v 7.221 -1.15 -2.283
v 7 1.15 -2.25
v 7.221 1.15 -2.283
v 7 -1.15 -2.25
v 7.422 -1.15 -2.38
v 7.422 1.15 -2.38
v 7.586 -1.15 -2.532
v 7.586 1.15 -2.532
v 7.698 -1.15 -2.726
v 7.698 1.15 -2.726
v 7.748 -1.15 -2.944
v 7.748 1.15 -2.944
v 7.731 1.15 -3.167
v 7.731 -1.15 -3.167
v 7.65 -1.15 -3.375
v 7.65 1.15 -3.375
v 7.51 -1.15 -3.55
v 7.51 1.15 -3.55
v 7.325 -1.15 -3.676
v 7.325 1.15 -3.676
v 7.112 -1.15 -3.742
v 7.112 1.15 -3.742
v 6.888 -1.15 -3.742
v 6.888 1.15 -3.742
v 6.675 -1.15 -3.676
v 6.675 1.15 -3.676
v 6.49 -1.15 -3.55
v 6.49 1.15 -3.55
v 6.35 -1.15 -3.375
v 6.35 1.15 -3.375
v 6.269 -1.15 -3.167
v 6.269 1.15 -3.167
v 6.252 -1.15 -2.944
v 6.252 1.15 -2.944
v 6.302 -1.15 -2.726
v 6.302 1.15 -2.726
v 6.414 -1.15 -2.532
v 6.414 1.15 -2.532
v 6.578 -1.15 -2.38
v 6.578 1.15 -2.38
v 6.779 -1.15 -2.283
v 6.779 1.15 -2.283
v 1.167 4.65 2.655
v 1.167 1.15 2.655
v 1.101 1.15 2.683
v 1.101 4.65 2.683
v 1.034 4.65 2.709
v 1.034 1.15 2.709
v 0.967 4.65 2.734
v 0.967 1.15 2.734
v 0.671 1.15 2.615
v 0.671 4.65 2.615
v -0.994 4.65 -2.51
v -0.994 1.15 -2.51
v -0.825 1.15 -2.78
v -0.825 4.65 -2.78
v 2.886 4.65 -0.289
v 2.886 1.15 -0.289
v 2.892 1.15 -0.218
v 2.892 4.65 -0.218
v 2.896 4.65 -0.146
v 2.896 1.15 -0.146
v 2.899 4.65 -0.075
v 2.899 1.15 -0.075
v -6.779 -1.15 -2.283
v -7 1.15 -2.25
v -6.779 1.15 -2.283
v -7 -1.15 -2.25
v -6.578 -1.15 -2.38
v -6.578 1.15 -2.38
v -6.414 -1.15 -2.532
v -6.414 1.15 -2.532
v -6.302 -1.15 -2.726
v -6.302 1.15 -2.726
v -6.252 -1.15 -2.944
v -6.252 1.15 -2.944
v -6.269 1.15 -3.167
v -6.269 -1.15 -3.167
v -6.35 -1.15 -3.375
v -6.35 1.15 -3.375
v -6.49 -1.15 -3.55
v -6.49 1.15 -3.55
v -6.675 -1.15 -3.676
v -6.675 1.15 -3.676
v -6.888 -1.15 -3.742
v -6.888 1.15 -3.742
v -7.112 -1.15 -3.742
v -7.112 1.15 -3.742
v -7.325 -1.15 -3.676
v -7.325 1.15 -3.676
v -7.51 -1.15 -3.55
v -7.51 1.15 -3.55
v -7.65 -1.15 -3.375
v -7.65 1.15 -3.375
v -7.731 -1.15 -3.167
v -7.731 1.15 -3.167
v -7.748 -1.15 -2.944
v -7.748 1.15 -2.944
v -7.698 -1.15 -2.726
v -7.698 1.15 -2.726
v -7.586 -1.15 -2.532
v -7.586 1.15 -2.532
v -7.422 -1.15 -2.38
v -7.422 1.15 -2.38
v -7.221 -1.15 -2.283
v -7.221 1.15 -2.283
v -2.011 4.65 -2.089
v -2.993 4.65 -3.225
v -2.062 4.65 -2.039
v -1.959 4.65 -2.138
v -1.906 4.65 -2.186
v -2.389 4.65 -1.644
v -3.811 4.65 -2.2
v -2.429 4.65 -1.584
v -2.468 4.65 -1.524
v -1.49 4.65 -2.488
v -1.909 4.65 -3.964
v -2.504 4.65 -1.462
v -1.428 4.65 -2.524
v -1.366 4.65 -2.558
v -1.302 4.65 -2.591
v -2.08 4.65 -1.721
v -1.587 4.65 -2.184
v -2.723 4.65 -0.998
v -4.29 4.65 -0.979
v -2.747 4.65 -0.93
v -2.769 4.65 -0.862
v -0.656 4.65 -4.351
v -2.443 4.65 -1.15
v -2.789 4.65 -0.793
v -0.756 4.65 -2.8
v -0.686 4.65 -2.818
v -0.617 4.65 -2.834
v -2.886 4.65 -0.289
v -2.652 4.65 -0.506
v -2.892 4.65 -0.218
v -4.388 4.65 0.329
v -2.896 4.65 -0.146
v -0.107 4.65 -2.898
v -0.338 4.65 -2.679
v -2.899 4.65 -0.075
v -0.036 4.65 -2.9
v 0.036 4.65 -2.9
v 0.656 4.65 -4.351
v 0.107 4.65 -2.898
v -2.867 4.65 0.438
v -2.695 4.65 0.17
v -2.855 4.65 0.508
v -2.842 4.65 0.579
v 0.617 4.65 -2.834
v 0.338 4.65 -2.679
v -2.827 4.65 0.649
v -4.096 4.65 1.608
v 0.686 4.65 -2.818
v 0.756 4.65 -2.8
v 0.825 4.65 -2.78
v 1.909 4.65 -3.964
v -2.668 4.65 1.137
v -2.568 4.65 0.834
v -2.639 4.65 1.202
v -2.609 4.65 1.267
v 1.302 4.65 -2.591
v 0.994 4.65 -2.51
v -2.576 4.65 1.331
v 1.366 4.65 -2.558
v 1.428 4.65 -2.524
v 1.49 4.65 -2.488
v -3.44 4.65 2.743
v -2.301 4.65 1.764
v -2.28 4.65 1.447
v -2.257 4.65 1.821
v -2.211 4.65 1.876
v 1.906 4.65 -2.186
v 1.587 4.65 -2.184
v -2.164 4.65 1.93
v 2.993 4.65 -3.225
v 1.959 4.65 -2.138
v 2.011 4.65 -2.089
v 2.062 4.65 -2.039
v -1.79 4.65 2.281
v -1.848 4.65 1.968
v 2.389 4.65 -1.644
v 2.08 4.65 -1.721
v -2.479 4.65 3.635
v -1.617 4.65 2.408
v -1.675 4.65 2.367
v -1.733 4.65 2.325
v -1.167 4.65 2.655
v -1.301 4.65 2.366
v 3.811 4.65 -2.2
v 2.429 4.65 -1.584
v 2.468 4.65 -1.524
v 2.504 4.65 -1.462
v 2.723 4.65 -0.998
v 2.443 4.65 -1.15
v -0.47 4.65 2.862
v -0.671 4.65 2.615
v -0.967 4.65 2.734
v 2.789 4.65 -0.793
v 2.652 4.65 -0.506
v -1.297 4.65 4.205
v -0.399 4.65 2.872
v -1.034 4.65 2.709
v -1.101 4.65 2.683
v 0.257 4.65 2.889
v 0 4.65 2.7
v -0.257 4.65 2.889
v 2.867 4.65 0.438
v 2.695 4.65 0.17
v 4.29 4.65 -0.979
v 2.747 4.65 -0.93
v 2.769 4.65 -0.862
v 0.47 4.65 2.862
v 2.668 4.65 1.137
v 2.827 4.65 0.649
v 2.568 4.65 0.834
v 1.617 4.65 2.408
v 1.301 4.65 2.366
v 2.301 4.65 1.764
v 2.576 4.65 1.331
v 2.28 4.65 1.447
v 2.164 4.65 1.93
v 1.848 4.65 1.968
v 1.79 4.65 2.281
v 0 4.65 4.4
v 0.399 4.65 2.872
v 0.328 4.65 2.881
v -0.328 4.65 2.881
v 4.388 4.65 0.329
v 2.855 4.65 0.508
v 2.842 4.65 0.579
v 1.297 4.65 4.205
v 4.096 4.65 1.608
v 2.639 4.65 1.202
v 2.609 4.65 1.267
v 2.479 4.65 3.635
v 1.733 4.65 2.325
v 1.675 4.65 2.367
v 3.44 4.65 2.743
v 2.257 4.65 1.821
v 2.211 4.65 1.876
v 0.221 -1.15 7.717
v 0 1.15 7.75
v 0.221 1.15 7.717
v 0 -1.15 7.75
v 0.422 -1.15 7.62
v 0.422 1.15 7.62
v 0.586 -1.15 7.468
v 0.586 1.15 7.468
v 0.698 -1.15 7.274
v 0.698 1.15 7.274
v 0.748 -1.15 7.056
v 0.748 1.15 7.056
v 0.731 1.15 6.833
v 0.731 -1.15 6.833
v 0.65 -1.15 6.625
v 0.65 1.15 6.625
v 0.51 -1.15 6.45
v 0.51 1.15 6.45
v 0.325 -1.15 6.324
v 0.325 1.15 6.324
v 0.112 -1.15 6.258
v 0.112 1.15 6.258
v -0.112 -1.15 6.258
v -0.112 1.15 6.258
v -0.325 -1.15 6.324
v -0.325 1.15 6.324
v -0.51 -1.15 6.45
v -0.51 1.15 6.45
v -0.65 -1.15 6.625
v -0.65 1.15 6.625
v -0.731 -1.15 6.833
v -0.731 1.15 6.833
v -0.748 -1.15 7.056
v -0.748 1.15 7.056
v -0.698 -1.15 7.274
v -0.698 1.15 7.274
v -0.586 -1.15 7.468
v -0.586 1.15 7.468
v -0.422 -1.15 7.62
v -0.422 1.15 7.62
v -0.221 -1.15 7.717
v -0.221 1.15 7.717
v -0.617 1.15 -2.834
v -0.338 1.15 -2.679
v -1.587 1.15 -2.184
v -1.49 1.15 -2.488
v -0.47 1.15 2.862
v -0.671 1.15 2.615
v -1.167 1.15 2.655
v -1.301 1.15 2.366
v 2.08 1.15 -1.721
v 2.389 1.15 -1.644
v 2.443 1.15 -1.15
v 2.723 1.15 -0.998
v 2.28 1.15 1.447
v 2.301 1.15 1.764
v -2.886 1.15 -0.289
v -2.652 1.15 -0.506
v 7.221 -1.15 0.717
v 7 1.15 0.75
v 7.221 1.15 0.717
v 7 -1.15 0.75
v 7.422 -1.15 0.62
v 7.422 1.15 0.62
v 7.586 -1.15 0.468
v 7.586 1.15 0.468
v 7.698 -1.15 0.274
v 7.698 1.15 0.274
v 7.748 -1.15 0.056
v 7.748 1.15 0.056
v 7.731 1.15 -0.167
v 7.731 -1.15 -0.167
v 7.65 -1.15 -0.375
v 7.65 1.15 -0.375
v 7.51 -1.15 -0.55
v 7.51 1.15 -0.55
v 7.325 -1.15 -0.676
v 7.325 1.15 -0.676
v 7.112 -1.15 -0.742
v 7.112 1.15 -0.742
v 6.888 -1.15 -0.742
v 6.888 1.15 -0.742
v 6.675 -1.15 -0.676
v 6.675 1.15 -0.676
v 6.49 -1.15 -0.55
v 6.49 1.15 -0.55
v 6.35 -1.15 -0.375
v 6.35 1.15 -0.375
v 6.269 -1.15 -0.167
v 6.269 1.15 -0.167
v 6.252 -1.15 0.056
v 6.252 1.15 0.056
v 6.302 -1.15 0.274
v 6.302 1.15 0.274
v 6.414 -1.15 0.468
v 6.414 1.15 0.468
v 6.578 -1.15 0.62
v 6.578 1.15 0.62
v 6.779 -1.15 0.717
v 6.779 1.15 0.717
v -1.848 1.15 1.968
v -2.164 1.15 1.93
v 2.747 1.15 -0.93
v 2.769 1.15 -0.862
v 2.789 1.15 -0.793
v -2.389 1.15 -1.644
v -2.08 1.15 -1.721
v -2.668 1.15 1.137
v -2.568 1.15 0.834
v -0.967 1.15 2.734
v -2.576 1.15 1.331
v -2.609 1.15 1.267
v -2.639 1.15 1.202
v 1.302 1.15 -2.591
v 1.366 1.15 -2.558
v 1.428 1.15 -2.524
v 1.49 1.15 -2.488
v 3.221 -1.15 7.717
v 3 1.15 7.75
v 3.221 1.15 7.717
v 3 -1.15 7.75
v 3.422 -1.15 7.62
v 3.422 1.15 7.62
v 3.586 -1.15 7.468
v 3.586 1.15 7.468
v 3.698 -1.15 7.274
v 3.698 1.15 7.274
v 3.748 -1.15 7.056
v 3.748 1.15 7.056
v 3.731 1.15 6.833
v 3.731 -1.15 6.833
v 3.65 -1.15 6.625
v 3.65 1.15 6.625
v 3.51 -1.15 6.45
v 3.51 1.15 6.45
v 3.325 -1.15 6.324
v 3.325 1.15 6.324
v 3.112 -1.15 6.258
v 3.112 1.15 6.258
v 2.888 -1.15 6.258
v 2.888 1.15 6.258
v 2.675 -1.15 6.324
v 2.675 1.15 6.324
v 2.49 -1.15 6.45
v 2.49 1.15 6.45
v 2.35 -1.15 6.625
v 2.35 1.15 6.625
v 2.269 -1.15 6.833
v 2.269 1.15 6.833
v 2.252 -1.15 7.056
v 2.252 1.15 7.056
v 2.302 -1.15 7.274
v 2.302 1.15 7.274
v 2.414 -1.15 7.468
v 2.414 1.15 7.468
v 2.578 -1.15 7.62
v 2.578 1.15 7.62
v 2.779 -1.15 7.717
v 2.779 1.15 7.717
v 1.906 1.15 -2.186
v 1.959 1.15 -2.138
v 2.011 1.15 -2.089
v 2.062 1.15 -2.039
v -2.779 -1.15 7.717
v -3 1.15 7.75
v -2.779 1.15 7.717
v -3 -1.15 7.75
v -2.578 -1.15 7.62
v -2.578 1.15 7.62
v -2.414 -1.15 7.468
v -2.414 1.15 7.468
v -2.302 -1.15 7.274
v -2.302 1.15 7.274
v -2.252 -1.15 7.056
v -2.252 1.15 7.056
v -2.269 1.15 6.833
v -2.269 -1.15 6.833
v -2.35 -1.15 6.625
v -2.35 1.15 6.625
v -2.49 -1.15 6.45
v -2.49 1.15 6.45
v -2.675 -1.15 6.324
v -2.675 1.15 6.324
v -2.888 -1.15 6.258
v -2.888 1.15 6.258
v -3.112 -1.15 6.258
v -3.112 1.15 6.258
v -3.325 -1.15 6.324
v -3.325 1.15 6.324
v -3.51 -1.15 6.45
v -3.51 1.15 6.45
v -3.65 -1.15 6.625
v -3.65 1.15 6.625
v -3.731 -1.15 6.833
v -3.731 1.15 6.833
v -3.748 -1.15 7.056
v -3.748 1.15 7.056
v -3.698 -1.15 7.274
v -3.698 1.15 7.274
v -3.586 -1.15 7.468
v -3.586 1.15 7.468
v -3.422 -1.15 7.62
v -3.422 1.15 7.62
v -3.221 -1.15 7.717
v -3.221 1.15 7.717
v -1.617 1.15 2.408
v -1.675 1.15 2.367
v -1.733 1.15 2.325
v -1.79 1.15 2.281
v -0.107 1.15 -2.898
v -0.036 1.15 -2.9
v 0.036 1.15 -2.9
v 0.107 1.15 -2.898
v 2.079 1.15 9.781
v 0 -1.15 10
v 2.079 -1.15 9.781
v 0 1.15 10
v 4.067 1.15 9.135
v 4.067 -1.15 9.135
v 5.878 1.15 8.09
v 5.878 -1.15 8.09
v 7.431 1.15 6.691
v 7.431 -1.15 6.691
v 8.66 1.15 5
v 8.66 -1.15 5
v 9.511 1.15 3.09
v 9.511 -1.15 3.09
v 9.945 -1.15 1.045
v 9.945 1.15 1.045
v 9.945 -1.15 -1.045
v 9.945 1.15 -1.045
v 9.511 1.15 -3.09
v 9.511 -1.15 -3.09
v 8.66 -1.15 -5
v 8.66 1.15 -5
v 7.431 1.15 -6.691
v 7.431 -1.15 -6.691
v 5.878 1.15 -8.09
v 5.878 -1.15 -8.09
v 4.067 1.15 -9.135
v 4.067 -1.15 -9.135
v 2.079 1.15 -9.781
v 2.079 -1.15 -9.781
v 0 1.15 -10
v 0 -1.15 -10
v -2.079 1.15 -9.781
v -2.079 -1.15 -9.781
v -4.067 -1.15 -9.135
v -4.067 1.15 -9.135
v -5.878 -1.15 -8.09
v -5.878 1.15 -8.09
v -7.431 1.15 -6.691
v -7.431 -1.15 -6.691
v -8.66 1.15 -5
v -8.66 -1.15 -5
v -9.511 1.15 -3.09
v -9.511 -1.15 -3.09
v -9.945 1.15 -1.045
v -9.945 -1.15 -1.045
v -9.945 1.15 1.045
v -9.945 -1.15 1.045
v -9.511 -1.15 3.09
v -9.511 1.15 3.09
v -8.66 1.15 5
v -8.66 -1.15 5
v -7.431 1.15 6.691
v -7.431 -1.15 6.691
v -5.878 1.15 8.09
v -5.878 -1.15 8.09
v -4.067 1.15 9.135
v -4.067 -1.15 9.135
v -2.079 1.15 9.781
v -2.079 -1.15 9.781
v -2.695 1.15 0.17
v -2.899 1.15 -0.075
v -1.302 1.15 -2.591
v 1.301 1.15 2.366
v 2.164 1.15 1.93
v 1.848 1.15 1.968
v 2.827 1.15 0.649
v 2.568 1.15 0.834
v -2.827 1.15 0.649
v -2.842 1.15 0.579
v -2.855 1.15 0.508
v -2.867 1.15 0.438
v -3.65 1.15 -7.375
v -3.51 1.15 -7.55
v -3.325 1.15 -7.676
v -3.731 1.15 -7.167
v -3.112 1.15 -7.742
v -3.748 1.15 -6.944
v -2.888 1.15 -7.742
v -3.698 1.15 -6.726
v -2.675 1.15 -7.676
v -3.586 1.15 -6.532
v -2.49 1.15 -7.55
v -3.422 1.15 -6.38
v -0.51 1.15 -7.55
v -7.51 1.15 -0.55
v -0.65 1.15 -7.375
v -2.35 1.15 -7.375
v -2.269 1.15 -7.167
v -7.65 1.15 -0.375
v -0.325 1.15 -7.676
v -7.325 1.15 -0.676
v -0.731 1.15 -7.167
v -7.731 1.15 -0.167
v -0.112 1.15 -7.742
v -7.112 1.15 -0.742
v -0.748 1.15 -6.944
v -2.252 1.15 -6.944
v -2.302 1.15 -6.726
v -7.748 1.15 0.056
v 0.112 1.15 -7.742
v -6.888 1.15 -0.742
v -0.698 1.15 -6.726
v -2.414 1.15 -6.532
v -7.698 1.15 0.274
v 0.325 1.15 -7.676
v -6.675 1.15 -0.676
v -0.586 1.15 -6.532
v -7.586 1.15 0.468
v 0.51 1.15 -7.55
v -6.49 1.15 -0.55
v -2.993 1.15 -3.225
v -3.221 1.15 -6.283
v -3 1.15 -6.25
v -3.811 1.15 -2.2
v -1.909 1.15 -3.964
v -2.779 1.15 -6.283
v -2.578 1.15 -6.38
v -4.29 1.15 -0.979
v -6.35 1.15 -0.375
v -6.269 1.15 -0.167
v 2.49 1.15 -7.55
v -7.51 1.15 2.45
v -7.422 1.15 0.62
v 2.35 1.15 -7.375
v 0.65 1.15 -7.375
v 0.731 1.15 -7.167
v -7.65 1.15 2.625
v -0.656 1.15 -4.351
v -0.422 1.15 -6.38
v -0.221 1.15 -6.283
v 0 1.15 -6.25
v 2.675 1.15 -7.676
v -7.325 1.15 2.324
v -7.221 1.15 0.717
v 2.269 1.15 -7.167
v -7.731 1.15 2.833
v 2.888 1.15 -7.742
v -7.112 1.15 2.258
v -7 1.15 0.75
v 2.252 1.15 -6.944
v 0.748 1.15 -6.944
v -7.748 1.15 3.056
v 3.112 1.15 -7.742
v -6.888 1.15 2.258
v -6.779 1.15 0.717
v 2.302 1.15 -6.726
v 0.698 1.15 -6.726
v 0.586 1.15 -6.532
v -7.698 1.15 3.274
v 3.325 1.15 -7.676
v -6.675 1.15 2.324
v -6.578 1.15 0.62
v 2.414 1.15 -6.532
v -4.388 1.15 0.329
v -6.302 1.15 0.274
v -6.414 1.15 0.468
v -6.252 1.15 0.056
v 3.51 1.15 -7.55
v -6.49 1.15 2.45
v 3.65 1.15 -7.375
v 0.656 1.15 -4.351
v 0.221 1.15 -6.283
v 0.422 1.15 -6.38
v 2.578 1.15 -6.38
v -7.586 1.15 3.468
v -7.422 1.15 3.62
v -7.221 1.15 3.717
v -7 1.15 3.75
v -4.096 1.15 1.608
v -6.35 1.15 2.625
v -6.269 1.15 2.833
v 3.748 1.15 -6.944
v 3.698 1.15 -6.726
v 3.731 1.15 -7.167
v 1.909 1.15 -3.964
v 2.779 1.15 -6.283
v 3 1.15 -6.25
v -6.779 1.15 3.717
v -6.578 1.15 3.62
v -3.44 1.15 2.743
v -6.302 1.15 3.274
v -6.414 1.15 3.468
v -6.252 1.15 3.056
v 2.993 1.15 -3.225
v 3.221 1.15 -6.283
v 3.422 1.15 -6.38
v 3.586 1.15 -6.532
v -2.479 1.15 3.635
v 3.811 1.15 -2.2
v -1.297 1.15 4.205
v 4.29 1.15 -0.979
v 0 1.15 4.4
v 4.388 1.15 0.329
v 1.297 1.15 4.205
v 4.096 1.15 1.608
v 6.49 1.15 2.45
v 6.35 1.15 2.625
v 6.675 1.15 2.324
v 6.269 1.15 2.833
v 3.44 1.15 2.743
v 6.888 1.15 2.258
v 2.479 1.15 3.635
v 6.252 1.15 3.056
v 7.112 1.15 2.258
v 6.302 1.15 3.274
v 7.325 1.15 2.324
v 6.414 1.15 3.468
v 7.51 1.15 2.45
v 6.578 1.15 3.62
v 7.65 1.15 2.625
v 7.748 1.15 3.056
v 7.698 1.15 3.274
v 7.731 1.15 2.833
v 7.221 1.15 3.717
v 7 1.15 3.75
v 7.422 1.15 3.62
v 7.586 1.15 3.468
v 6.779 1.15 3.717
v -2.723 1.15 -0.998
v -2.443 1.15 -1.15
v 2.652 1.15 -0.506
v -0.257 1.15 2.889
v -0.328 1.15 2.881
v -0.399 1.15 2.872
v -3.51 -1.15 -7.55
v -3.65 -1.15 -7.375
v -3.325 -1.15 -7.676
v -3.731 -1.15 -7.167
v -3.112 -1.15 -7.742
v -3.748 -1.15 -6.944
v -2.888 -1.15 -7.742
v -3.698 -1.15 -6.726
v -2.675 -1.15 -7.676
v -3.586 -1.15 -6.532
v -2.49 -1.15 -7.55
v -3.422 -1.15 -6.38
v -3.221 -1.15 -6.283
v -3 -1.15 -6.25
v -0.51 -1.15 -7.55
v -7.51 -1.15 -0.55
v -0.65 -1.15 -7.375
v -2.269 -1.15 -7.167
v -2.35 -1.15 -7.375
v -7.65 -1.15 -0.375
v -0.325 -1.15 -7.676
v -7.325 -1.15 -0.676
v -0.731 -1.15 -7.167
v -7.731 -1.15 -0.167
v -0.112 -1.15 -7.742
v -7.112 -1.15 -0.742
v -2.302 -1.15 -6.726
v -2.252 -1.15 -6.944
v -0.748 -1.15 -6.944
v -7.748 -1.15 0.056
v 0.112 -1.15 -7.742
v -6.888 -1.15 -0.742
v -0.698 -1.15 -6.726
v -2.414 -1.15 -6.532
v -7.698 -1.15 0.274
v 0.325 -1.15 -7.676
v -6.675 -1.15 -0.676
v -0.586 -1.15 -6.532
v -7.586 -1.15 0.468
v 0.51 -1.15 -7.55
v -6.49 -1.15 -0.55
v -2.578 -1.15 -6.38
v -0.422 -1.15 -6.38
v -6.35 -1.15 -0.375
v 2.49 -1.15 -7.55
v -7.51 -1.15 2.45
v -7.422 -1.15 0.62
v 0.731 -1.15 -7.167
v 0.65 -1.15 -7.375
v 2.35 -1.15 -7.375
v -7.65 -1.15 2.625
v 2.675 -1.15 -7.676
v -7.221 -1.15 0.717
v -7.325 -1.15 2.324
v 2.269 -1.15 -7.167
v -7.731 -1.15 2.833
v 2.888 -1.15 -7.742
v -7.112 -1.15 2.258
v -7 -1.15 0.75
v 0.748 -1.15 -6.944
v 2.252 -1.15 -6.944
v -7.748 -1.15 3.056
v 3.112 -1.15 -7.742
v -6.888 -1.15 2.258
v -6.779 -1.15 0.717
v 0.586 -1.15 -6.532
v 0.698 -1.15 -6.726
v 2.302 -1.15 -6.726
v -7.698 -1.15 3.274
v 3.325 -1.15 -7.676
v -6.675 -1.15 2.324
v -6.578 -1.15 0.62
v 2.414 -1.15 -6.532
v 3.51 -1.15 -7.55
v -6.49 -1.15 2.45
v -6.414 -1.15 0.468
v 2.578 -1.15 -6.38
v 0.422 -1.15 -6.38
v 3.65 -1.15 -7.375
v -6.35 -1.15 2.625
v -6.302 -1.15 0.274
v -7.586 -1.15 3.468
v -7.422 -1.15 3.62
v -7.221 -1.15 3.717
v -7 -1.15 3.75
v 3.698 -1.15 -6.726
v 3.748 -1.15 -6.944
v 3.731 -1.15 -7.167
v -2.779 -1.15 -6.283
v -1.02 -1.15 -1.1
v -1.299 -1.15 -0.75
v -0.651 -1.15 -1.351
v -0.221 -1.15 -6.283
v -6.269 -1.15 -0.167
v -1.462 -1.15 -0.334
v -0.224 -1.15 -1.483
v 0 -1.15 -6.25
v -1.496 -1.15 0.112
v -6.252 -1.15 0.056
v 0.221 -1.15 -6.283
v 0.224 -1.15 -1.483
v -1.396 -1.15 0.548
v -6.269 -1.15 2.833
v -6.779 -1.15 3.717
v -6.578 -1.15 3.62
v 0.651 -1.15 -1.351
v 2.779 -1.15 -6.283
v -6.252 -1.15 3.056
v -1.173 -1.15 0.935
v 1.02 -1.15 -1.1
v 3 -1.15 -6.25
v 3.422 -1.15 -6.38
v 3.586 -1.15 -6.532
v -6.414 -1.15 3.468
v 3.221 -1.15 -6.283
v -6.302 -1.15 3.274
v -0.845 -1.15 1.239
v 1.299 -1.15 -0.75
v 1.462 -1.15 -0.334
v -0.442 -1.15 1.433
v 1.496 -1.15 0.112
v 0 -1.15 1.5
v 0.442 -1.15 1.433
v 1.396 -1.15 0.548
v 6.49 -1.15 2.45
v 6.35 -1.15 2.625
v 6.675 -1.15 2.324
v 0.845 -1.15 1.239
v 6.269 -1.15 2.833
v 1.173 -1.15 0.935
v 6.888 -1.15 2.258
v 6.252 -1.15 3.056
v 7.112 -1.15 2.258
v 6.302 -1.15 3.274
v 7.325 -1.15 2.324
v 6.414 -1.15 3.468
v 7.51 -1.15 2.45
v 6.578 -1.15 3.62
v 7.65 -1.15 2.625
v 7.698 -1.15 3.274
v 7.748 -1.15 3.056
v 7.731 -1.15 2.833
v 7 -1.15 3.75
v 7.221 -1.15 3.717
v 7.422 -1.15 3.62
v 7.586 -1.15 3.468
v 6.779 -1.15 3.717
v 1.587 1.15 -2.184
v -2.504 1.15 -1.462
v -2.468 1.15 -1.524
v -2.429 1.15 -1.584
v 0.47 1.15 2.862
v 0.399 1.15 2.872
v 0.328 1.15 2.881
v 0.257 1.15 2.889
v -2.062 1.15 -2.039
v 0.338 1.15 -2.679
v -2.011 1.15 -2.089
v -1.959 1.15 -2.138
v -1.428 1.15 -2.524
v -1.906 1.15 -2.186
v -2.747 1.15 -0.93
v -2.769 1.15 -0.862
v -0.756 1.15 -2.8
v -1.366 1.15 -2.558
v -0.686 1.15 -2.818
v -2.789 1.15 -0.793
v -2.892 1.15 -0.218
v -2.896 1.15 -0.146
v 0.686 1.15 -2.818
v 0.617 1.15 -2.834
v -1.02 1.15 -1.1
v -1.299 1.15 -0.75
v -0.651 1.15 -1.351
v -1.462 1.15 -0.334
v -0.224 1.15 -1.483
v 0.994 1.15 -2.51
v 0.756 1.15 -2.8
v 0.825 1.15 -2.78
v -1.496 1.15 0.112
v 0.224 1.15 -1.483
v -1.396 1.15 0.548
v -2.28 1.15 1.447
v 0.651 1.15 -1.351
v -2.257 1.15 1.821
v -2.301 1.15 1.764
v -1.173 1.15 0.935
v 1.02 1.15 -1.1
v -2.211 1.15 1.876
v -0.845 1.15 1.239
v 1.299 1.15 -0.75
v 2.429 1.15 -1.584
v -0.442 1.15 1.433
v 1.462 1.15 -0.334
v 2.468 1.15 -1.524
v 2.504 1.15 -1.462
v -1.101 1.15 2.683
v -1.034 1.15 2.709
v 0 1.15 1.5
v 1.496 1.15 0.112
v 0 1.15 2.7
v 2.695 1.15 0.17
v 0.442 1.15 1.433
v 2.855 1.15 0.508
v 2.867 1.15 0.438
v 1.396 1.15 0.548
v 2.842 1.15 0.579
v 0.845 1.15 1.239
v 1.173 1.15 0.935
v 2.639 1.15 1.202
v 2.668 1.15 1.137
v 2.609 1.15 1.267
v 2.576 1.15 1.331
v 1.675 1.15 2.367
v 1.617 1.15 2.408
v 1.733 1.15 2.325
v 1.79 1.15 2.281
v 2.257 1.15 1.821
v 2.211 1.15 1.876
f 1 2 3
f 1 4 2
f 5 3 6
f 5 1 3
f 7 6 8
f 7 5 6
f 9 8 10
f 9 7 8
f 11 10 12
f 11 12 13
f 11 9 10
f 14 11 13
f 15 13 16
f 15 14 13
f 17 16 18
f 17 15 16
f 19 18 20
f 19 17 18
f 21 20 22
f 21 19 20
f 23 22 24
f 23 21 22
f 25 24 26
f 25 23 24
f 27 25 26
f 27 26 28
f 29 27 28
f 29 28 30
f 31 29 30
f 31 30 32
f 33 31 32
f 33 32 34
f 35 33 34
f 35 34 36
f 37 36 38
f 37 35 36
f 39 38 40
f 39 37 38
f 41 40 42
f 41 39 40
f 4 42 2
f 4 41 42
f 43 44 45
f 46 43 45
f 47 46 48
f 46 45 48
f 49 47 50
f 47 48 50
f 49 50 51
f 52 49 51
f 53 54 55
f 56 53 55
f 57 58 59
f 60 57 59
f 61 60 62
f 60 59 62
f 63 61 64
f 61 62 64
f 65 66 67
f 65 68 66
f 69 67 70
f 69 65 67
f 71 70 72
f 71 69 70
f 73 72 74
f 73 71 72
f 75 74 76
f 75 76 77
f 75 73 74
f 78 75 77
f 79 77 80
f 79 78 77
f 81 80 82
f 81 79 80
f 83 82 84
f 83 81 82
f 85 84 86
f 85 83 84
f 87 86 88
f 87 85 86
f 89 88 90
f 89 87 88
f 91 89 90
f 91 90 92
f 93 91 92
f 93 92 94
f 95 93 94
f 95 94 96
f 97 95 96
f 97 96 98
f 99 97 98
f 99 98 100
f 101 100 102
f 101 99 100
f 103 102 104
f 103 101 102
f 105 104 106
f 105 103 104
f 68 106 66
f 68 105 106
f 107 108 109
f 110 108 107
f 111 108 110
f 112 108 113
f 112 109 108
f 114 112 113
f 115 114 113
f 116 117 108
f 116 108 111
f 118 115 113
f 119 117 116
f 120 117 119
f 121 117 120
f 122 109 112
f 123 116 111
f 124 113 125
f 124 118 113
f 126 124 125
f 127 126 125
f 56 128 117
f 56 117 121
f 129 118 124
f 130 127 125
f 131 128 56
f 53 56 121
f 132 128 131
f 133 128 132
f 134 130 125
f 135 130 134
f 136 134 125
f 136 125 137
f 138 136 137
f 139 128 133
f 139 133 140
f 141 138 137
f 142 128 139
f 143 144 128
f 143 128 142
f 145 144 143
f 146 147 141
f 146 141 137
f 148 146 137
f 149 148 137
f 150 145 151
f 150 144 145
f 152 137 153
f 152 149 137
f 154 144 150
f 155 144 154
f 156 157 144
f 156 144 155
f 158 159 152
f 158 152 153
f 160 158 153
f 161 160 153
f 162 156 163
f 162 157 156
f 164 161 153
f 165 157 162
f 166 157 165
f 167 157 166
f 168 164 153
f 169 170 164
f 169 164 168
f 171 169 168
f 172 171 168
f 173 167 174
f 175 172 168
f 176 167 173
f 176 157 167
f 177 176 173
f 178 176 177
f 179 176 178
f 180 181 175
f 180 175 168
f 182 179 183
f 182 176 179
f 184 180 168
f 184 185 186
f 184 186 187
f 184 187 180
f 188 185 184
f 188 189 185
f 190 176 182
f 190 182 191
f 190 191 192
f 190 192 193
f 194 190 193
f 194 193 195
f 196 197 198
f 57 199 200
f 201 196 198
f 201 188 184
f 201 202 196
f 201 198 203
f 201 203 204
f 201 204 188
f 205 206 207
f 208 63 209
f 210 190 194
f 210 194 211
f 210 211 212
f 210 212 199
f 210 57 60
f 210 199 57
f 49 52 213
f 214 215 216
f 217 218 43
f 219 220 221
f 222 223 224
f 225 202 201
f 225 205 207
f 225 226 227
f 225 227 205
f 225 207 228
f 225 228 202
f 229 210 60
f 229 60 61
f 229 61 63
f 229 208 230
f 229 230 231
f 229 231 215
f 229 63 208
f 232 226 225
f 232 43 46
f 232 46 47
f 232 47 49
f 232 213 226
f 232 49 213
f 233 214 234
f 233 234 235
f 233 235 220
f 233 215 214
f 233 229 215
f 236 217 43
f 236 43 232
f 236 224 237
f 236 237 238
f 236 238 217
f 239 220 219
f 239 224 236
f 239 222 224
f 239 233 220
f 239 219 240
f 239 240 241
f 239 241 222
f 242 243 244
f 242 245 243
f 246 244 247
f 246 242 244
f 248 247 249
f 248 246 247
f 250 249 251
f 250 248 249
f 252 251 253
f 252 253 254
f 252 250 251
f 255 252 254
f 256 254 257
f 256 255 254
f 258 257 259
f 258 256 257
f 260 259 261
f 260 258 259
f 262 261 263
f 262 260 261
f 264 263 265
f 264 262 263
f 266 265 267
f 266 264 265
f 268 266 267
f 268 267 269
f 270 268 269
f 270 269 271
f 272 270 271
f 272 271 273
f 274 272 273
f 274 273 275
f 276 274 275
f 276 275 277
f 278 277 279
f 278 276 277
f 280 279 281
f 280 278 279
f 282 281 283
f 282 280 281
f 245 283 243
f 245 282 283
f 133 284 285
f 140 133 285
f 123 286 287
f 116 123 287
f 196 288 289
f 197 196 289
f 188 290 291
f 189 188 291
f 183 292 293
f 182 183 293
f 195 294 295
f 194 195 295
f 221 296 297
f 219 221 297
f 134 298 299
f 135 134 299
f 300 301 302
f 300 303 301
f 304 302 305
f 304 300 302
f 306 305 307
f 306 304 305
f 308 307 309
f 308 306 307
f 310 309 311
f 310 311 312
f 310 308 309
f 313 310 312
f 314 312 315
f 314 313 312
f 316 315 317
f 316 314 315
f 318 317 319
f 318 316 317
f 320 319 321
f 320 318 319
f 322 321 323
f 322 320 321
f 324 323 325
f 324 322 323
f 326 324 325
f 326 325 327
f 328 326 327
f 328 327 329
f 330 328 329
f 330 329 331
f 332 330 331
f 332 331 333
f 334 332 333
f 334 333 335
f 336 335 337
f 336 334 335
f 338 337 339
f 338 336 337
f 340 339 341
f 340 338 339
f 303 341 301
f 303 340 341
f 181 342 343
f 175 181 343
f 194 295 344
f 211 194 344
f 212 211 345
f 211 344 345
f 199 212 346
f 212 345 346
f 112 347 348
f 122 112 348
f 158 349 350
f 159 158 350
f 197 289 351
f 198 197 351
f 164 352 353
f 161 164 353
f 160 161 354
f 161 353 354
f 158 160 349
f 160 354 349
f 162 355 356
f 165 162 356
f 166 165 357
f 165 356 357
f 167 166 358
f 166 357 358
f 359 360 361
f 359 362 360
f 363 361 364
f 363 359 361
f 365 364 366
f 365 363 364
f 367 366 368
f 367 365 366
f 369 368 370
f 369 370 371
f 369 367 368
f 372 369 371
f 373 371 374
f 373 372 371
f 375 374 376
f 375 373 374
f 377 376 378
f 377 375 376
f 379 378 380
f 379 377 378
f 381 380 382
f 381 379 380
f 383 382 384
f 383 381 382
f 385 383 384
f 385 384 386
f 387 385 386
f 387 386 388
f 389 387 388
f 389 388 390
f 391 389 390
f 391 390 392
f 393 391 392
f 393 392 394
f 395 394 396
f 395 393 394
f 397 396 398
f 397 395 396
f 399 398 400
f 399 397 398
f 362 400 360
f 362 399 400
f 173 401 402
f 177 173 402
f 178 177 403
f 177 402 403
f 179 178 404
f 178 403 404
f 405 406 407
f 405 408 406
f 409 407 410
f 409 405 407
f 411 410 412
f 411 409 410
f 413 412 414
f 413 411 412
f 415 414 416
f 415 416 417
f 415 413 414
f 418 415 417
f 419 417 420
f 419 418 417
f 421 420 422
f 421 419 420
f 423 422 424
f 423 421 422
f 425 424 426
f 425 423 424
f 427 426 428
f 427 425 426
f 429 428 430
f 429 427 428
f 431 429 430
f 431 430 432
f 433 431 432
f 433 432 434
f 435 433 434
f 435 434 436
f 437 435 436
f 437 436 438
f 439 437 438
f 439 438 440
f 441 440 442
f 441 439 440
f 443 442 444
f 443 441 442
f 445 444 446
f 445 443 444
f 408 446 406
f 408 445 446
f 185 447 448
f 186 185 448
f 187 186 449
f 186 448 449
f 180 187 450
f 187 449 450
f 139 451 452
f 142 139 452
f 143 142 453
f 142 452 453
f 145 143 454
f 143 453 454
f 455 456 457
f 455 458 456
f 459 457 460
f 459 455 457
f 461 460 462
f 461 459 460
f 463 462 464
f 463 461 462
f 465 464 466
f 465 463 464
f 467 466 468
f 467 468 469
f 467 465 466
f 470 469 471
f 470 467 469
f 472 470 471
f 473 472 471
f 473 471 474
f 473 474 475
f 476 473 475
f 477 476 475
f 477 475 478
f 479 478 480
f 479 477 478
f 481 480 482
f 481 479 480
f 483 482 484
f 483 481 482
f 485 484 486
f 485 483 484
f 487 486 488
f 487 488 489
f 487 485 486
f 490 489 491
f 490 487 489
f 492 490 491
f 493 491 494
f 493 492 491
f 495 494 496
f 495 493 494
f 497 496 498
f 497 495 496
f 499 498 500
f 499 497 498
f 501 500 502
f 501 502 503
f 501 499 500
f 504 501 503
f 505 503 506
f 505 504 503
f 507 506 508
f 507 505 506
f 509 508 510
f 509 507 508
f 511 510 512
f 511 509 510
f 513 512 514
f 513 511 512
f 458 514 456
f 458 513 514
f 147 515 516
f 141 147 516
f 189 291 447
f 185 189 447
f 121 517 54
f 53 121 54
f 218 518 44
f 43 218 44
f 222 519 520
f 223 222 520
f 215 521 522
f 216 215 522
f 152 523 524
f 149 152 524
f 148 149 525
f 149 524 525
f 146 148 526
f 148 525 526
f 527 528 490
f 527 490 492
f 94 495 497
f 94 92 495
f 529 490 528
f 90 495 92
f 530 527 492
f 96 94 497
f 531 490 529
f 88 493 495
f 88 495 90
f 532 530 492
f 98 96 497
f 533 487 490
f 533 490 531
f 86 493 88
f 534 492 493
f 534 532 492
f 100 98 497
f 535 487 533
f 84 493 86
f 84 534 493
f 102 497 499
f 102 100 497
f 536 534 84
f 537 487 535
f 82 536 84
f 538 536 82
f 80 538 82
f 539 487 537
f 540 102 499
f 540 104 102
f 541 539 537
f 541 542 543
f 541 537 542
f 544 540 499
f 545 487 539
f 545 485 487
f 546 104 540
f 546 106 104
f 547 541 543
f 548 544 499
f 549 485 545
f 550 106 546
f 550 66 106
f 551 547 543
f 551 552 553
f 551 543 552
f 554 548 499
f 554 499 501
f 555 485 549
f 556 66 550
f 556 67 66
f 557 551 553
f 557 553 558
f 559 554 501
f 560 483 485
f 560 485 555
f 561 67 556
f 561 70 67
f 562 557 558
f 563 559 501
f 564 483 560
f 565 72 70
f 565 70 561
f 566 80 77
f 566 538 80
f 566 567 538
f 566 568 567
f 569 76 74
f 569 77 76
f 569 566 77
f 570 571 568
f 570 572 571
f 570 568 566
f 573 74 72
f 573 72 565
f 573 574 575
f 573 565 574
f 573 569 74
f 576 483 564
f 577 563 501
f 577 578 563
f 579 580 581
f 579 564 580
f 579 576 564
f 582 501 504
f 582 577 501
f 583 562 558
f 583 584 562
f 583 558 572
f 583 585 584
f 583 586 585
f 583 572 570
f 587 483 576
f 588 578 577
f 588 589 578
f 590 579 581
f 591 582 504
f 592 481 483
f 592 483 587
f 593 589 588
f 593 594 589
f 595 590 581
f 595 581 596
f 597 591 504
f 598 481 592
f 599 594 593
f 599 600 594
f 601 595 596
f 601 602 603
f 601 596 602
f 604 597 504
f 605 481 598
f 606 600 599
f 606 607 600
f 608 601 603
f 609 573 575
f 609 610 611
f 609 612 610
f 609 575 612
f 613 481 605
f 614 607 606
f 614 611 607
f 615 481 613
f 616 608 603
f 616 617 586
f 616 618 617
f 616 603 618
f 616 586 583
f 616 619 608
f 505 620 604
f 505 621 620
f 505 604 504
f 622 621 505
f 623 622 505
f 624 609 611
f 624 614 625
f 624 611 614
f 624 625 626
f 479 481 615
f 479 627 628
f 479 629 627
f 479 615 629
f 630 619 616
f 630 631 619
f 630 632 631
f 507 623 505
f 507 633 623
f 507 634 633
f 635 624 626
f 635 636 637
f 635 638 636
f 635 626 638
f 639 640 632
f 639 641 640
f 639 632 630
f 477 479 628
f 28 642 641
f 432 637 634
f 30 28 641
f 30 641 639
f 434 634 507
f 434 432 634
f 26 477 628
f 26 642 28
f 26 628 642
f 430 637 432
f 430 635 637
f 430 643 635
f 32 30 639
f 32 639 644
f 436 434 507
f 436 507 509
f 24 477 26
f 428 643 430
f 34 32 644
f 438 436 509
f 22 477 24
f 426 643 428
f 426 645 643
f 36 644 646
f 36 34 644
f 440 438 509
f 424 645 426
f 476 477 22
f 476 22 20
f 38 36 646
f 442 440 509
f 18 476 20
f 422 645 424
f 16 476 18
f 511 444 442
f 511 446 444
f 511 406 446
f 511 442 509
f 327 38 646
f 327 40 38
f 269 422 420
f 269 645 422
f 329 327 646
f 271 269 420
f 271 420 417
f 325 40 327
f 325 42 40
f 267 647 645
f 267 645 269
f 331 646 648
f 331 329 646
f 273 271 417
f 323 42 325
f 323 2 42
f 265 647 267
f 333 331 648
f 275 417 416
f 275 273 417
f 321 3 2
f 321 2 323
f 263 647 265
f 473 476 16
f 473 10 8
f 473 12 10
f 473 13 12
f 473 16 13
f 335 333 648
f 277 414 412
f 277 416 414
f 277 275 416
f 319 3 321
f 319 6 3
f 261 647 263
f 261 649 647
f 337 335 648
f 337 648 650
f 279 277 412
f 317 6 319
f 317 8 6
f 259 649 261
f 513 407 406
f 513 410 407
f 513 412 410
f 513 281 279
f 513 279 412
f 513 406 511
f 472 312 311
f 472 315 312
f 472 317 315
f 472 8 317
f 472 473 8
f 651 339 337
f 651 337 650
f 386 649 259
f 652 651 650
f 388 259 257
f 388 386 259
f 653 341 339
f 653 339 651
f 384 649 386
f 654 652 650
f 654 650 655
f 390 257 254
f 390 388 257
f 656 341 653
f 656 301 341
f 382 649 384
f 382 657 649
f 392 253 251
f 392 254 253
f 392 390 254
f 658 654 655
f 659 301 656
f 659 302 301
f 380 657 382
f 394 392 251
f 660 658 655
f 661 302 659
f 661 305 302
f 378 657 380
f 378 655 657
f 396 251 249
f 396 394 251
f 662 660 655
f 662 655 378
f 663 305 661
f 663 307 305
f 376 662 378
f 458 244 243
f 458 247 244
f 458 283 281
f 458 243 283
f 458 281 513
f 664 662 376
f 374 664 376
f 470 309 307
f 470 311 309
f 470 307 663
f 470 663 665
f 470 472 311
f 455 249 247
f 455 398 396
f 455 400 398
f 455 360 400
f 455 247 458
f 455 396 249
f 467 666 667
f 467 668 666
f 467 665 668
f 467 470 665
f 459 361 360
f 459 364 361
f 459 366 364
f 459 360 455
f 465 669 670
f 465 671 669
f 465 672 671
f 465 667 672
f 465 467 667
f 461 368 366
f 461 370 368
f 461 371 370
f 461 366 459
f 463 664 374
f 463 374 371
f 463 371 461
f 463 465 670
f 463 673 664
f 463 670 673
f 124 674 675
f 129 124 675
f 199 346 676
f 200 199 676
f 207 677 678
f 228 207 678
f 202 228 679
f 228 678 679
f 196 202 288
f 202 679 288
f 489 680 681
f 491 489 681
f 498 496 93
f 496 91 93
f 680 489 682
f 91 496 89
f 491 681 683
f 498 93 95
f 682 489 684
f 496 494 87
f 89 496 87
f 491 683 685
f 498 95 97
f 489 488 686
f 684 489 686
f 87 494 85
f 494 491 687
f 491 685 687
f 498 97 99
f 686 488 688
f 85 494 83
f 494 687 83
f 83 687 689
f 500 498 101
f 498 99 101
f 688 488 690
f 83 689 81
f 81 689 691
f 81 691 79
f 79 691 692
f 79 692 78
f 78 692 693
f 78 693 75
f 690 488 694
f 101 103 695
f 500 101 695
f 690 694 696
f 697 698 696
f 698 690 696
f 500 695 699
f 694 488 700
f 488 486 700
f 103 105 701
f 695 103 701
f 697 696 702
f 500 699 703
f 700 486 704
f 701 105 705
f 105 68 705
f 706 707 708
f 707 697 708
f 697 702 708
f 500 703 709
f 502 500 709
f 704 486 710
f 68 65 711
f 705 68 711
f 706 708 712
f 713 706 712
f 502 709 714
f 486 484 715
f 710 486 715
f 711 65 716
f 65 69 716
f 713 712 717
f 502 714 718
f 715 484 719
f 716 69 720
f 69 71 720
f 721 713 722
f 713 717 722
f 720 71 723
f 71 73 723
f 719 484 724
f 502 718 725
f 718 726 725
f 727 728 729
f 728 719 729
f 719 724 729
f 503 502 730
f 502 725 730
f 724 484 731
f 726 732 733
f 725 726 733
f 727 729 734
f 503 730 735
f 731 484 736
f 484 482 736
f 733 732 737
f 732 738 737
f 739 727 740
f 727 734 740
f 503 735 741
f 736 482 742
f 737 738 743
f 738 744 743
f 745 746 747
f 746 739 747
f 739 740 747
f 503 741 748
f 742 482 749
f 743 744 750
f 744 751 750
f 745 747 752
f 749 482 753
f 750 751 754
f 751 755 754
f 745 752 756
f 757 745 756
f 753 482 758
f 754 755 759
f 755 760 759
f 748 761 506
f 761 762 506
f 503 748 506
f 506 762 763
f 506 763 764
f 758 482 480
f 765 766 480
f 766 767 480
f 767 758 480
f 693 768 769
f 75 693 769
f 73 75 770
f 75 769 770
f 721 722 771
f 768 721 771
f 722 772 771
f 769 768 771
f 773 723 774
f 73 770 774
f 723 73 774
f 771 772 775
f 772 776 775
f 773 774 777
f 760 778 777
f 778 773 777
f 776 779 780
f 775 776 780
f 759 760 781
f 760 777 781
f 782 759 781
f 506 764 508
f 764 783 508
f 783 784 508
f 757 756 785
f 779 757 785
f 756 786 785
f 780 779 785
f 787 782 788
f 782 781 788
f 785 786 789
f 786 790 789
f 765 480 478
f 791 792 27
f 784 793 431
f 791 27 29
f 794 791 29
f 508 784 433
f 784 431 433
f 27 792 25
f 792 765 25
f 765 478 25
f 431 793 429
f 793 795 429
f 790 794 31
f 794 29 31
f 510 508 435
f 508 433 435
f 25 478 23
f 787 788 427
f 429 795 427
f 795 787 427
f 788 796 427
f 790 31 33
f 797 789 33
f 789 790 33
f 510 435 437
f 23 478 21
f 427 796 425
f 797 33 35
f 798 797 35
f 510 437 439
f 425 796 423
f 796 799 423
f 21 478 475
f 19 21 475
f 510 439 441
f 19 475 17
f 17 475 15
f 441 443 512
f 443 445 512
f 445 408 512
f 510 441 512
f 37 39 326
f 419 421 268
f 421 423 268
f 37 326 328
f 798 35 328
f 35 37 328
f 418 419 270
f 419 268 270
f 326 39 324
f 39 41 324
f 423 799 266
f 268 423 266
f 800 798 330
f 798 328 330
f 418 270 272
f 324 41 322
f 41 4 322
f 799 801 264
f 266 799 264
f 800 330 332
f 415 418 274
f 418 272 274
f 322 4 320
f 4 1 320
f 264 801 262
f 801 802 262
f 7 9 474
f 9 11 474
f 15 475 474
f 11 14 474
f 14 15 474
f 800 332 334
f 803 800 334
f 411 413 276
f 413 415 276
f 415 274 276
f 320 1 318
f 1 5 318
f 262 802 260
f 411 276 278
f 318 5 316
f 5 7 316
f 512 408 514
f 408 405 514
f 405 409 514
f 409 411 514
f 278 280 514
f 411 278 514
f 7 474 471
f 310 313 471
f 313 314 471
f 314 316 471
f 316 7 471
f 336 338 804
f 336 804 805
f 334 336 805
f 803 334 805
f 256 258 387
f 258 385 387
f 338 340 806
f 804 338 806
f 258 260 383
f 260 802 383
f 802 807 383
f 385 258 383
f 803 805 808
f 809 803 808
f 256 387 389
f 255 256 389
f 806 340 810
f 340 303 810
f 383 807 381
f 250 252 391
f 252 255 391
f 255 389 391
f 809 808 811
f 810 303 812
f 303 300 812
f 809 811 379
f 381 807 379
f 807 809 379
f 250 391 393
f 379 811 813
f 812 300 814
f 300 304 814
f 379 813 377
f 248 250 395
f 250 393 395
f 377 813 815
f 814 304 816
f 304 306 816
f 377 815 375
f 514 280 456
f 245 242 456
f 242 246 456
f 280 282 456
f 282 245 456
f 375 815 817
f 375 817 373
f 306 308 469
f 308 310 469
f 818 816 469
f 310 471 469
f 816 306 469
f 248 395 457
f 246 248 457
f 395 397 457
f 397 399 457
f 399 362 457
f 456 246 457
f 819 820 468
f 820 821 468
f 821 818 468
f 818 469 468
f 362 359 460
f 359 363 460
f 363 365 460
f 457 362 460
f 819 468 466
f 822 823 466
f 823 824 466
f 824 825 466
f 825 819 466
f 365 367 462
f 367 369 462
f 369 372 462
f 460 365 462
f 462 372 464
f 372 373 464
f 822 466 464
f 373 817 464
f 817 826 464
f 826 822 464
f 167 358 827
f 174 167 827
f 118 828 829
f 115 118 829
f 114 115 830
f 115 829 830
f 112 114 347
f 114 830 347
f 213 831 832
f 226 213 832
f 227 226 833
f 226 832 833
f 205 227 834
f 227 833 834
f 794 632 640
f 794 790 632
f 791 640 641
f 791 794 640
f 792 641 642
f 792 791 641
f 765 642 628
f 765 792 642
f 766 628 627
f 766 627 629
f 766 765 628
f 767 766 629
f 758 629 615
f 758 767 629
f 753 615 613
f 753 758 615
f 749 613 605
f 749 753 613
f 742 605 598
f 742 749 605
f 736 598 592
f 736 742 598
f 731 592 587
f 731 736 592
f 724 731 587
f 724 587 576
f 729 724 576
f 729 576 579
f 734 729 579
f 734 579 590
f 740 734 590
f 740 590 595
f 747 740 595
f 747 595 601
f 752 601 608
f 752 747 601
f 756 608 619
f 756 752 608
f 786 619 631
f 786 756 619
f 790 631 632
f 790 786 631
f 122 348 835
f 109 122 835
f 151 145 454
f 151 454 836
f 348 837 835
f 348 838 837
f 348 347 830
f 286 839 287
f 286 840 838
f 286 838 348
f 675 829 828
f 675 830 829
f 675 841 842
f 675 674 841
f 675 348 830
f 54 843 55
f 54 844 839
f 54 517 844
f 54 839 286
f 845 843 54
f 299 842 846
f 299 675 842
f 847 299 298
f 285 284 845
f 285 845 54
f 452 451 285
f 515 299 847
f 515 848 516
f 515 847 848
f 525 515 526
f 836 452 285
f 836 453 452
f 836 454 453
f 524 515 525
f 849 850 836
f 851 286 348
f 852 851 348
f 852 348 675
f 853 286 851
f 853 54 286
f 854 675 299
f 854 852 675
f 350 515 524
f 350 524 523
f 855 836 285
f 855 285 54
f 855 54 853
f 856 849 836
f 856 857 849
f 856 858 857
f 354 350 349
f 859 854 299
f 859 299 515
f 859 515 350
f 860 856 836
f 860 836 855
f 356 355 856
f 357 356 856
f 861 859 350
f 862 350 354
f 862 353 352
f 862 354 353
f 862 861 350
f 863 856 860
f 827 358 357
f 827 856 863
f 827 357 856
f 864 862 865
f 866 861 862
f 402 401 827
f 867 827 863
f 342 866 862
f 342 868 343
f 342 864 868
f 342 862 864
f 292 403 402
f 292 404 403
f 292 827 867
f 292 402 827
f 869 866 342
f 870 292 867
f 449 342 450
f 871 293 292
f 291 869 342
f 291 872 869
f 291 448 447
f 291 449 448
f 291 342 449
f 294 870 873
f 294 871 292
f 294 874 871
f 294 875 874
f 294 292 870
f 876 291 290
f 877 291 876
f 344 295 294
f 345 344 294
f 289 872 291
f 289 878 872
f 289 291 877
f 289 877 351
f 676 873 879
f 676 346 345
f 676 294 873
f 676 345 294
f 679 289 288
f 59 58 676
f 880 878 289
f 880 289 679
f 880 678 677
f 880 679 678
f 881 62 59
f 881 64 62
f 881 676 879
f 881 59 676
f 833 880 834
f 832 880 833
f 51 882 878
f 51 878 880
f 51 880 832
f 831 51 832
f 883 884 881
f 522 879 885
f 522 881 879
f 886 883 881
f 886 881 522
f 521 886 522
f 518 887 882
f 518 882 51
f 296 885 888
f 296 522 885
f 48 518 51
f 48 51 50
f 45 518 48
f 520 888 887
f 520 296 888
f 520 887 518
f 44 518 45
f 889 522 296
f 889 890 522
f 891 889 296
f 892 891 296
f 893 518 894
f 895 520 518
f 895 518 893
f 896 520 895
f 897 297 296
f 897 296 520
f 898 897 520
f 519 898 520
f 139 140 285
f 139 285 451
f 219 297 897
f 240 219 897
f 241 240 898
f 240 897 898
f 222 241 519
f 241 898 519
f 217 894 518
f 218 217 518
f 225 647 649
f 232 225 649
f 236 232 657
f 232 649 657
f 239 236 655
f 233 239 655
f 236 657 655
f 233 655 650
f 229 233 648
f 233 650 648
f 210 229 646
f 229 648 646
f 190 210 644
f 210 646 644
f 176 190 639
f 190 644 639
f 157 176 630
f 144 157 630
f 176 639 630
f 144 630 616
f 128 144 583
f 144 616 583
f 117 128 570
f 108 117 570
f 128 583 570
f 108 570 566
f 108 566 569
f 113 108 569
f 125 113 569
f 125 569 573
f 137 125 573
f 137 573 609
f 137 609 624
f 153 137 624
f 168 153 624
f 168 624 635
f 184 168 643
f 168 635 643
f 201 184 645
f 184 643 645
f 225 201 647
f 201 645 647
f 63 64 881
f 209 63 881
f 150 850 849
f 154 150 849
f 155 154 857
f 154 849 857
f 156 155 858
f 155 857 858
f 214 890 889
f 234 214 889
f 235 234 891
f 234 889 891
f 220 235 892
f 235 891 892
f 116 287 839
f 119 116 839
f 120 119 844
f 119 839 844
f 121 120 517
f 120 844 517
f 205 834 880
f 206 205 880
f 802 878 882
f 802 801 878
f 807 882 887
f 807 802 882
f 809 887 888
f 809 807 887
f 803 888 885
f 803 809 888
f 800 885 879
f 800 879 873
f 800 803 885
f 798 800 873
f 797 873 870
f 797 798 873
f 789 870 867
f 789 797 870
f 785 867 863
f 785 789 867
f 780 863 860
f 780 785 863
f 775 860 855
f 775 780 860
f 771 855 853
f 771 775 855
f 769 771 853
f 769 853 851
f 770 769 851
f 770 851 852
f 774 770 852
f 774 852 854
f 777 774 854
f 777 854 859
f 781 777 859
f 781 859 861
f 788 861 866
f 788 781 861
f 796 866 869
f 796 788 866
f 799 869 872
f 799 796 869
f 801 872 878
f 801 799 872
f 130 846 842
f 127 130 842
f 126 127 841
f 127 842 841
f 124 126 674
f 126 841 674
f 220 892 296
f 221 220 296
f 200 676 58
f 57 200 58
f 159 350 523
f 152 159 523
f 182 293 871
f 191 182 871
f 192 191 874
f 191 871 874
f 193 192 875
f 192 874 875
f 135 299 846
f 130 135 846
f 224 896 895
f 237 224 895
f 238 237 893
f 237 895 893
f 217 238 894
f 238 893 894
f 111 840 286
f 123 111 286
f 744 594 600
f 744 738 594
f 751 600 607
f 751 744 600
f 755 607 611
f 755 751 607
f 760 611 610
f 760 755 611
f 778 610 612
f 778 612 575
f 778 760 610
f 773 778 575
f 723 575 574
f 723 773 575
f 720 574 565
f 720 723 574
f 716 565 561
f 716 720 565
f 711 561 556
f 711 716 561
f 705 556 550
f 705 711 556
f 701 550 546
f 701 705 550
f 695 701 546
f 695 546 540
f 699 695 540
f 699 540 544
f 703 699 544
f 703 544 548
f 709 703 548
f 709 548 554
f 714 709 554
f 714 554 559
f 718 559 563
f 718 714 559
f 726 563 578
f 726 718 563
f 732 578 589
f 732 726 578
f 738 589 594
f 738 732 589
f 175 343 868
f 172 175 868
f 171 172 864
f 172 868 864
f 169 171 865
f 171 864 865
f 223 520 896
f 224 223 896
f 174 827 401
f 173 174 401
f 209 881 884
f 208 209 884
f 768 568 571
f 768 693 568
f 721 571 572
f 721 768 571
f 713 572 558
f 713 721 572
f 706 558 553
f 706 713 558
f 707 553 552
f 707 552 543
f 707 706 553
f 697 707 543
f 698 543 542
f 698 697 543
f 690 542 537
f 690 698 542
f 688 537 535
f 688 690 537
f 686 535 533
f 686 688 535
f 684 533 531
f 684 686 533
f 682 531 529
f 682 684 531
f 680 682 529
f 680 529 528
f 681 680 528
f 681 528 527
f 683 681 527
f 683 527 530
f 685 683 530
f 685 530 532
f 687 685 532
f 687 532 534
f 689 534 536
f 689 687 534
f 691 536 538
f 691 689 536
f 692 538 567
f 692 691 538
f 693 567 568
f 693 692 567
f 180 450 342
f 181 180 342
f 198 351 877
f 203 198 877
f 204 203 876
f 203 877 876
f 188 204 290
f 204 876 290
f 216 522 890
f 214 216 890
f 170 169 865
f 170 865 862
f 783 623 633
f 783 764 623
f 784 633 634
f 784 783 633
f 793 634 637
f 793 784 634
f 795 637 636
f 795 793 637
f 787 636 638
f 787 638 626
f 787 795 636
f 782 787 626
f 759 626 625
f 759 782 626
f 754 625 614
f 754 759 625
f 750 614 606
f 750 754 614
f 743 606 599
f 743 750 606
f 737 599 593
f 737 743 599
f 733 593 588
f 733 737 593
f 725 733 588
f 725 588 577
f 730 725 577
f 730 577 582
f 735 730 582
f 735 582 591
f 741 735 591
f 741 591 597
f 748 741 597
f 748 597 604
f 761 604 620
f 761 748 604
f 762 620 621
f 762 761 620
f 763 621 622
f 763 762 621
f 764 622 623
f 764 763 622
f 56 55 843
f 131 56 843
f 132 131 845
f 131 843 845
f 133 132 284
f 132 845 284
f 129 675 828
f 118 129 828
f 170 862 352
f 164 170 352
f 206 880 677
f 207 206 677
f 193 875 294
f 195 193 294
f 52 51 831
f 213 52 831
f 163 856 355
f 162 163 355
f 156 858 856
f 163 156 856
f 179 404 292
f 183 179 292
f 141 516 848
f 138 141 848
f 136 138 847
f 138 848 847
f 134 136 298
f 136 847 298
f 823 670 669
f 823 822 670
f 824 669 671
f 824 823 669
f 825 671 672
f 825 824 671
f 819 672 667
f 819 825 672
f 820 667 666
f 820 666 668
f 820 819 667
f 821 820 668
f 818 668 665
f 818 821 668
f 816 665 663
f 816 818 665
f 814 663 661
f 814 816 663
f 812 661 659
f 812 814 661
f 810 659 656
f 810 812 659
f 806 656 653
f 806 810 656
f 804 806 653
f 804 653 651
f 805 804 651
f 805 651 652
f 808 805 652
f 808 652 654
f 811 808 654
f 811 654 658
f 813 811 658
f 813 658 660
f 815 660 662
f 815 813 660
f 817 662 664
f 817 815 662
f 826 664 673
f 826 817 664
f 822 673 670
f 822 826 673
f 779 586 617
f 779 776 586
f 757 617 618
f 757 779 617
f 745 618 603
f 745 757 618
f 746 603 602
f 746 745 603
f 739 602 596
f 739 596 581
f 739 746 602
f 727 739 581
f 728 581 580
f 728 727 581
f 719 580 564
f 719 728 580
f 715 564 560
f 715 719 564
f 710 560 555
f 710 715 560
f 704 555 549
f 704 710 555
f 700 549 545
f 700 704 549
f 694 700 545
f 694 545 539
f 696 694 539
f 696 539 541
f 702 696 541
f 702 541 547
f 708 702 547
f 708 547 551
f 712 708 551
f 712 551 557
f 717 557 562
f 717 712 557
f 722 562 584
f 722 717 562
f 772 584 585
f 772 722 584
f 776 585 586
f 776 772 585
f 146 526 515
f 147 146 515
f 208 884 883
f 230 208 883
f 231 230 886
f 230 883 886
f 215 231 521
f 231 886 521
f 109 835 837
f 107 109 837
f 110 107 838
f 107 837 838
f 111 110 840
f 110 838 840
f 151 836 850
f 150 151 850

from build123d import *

# Parameters (mm, degrees)
SKETCH2_R           = 6
SKETCH2_R_2         = 1.5
BOSS_EXTRUDE1_DEPTH = 1.15
SKETCH3_R           = 4.4
BOSS_EXTRUDE2_DEPTH = 3.5
SKETCH5_R           = 10
SKETCH5_R_2         = 0.75
SKETCH5_R_3         = 1.5
BOSS_EXTRUDE4_DEPTH = 1.15


with BuildPart() as part:
    # Sketch2 → Boss-Extrude1 (new, symmetric)
    with BuildSketch(Plane(origin=(0, 0, 0), x_dir=(1, 0, 0), z_dir=(0, 1, 0))):
        with Locations(Location((0, 0, 0), (0, 0, 270))):
            Circle(SKETCH2_R)
        with Locations(Location((0, 0, 0), (0, 0, 270))):
            Circle(SKETCH2_R_2, mode=Mode.SUBTRACT)
    extrude(amount=BOSS_EXTRUDE1_DEPTH, both=True)

    # Sketch3 → Boss-Extrude2 (add)
    with BuildSketch(Plane(origin=(0, 1.15, 0), x_dir=(1, 0, 0), z_dir=(0, 1, 0))):
        with Locations(Location((0, 0, 0), (0, 0, 270))):
            Circle(SKETCH3_R)
        with BuildLine():
            Line((0.107421435, 2.898009771), (0.338399731, 2.678709694))
            Line((0.338399731, 2.678709694), (0.61665913, 2.83367809))
            ThreePointArc((0.61665913, 2.83367809), (0.721200673, 2.808891167), (0.824752316, 2.780248841))
            Line((0.824752316, 2.780248841), (0.993936292, 2.510396512))
            Line((0.993936292, 2.510396512), (1.301992734, 2.591295993))
            ThreePointArc((1.301992734, 2.591295993), (1.397085655, 2.541289372), (1.490260976, 2.48779465))
            Line((1.490260976, 2.48779465), (1.587020181, 2.184345885))
            Line((1.587020181, 2.184345885), (1.905517346, 2.186093238))
            ThreePointArc((1.905517346, 2.186093238), (1.985186607, 2.11400902), (2.062131058, 2.039023173))
            Line((2.062131058, 2.039023173), (2.080385755, 1.721044772))
            Line((2.080385755, 1.721044772), (2.389311295, 1.643530205))
            ThreePointArc((2.389311295, 1.643530205), (2.448550984, 1.553897705), (2.504429862, 1.46213237))
            Line((2.504429862, 1.46213237), (2.443033042, 1.149604087))
            Line((2.443033042, 1.149604087), (2.722976028, 0.997698125))
            ThreePointArc((2.722976028, 0.997698125), (2.758063897, 0.896149284), (2.789366126, 0.793370413))
            Line((2.789366126, 0.793370413), (2.652175577, 0.505929549))
            Line((2.652175577, 0.505929549), (2.885546163, 0.289177003))
            ThreePointArc((2.885546163, 0.289177003), (2.894277512, 0.182092507), (2.899036259, 0.074758075))
            Line((2.899036259, 0.074758075), (2.694672167, -0.169534403))
            Line((2.694672167, -0.169534403), (2.866806821, -0.437514174))
            ThreePointArc((2.866806821, -0.437514174), (2.848633027, -0.543405812), (2.826549281, -0.648551587))
            Line((2.826549281, -0.648551587), (2.567852594, -0.834345885))
            Line((2.567852594, -0.834345885), (2.667935462, -1.136714727))
            ThreePointArc((2.667935462, -1.136714727), (2.623998452, -1.234759946), (2.576459817, -1.331110368))
            Line((2.576459817, -1.331110368), (2.279685399, -1.446732346))
            Line((2.279685399, -1.446732346), (2.301427906, -1.764491312))
            ThreePointArc((2.301427906, -1.764491312), (2.234488404, -1.84852957), (2.164481907, -1.930030589))
            Line((2.164481907, -1.930030589), (1.848277186, -1.968215294))
            Line((1.848277186, -1.968215294), (1.790313171, -2.281398419))
            ThreePointArc((1.790313171, -2.281398419), (1.704577232, -2.346149284), (1.616501638, -2.40767989))
            Line((1.616501638, -2.40767989), (1.30073492, -2.366028036))
            Line((1.30073492, -2.366028036), (1.166706475, -2.654956874))
            ThreePointArc((1.166706475, -2.654956874), (1.067561203, -2.696351809), (0.966950626, -2.734045809))
            Line((0.966950626, -2.734045809), (0.671462695, -2.615174535))
            Line((0.671462695, -2.615174535), (0.469791321, -2.861694623))
            ThreePointArc((0.469791321, -2.861694623), (0.363466377, -2.877132634), (0.25664255, -2.888621575))
            Line((0.25664255, -2.888621575), (0, -2.7))
            Line((0, -2.7), (-0.25664255, -2.888621575))
            ThreePointArc((-0.25664255, -2.888621575), (-0.363466377, -2.877132634), (-0.469791321, -2.861694623))
            Line((-0.469791321, -2.861694623), (-0.671462695, -2.615174535))
            Line((-0.671462695, -2.615174535), (-0.966950626, -2.734045809))
            ThreePointArc((-0.966950626, -2.734045809), (-1.067561203, -2.696351809), (-1.166706475, -2.654956874))
            Line((-1.166706475, -2.654956874), (-1.30073492, -2.366028036))
            Line((-1.30073492, -2.366028036), (-1.616501638, -2.40767989))
            ThreePointArc((-1.616501638, -2.40767989), (-1.704577232, -2.346149284), (-1.790313171, -2.281398419))
            Line((-1.790313171, -2.281398419), (-1.848277186, -1.968215294))
            Line((-1.848277186, -1.968215294), (-2.164481907, -1.930030589))
            ThreePointArc((-2.164481907, -1.930030589), (-2.234488404, -1.84852957), (-2.301427906, -1.764491312))
            Line((-2.301427906, -1.764491312), (-2.279685399, -1.446732346))
            Line((-2.279685399, -1.446732346), (-2.576459817, -1.331110368))
            ThreePointArc((-2.576459817, -1.331110368), (-2.623998452, -1.234759946), (-2.667935462, -1.136714727))
            Line((-2.667935462, -1.136714727), (-2.567852594, -0.834345885))
            Line((-2.567852594, -0.834345885), (-2.826549281, -0.648551587))
            ThreePointArc((-2.826549281, -0.648551587), (-2.848633027, -0.543405812), (-2.866806821, -0.437514174))
            Line((-2.866806821, -0.437514174), (-2.694672167, -0.169534403))
            Line((-2.694672167, -0.169534403), (-2.899036259, 0.074758075))
            ThreePointArc((-2.899036259, 0.074758075), (-2.894277512, 0.182092507), (-2.885546163, 0.289177003))
            Line((-2.885546163, 0.289177003), (-2.652175577, 0.505929549))
            Line((-2.652175577, 0.505929549), (-2.789366126, 0.793370413))
            ThreePointArc((-2.789366126, 0.793370413), (-2.758063897, 0.896149284), (-2.722976028, 0.997698125))
            Line((-2.722976028, 0.997698125), (-2.443033042, 1.149604087))
            Line((-2.443033042, 1.149604087), (-2.504429862, 1.46213237))
            ThreePointArc((-2.504429862, 1.46213237), (-2.448550984, 1.553897705), (-2.389311295, 1.643530205))
            Line((-2.389311295, 1.643530205), (-2.080385755, 1.721044772))
            Line((-2.080385755, 1.721044772), (-2.062131058, 2.039023173))
            ThreePointArc((-2.062131058, 2.039023173), (-1.985186607, 2.11400902), (-1.905517346, 2.186093238))
            Line((-1.905517346, 2.186093238), (-1.587020181, 2.184345885))
            Line((-1.587020181, 2.184345885), (-1.490260976, 2.48779465))
            ThreePointArc((-1.490260976, 2.48779465), (-1.397085655, 2.541289372), (-1.301992734, 2.591295993))
            Line((-1.301992734, 2.591295993), (-0.993936292, 2.510396512))
            Line((-0.993936292, 2.510396512), (-0.824752316, 2.780248841))
            ThreePointArc((-0.824752316, 2.780248841), (-0.721200673, 2.808891167), (-0.61665913, 2.83367809))
            Line((-0.61665913, 2.83367809), (-0.338399731, 2.678709694))
            Line((-0.338399731, 2.678709694), (-0.107421435, 2.898009771))
            ThreePointArc((-0.107421435, 2.898009771), (0, 2.9), (0.107421435, 2.898009771))
        make_face(mode=Mode.SUBTRACT)
    extrude(amount=BOSS_EXTRUDE2_DEPTH)

    # Sketch5 → Boss-Extrude4 (add, symmetric)
    with BuildSketch(Plane(origin=(0, 0, 0), x_dir=(1, 0, 0), z_dir=(0, 1, 0))):
        with Locations(Location((0, 0, 0), (0, 0, 270))):
            Circle(SKETCH5_R)
        with Locations(Location((0, 7, 0), (0, 0, 270))):
            Circle(SKETCH5_R_2, mode=Mode.SUBTRACT)
        with Locations(Location((-3, 7, 0), (0, 0, 270))):
            Circle(SKETCH5_R_2, mode=Mode.SUBTRACT)
        with Locations(Location((3, 7, 0), (0, 0, 270))):
            Circle(SKETCH5_R_2, mode=Mode.SUBTRACT)
        with Locations(Location((7, 3, 0), (0, 0, 270))):
            Circle(SKETCH5_R_2, mode=Mode.SUBTRACT)
        with Locations(Location((7, 0, 0), (0, 0, 270))):
            Circle(SKETCH5_R_2, mode=Mode.SUBTRACT)
        with Locations(Location((7, -3, 0), (0, 0, 270))):
            Circle(SKETCH5_R_2, mode=Mode.SUBTRACT)
        with Locations(Location((3, -7, 0), (0, 0, 270))):
            Circle(SKETCH5_R_2, mode=Mode.SUBTRACT)
        with Locations(Location((0, -7, 0), (0, 0, 270))):
            Circle(SKETCH5_R_2, mode=Mode.SUBTRACT)
        with Locations(Location((-3, -7, 0), (0, 0, 270))):
            Circle(SKETCH5_R_2, mode=Mode.SUBTRACT)
        with Locations(Location((-7, -3, 0), (0, 0, 270))):
            Circle(SKETCH5_R_2, mode=Mode.SUBTRACT)
        with Locations(Location((-7, 0, 0), (0, 0, 270))):
            Circle(SKETCH5_R_2, mode=Mode.SUBTRACT)
        with Locations(Location((-7, 3, 0), (0, 0, 270))):
            Circle(SKETCH5_R_2, mode=Mode.SUBTRACT)
        with Locations(Location((0, 0, 0), (0, 0, 270))):
            Circle(SKETCH5_R_3, mode=Mode.SUBTRACT)
    extrude(amount=BOSS_EXTRUDE4_DEPTH, both=True)


solid = part.part
